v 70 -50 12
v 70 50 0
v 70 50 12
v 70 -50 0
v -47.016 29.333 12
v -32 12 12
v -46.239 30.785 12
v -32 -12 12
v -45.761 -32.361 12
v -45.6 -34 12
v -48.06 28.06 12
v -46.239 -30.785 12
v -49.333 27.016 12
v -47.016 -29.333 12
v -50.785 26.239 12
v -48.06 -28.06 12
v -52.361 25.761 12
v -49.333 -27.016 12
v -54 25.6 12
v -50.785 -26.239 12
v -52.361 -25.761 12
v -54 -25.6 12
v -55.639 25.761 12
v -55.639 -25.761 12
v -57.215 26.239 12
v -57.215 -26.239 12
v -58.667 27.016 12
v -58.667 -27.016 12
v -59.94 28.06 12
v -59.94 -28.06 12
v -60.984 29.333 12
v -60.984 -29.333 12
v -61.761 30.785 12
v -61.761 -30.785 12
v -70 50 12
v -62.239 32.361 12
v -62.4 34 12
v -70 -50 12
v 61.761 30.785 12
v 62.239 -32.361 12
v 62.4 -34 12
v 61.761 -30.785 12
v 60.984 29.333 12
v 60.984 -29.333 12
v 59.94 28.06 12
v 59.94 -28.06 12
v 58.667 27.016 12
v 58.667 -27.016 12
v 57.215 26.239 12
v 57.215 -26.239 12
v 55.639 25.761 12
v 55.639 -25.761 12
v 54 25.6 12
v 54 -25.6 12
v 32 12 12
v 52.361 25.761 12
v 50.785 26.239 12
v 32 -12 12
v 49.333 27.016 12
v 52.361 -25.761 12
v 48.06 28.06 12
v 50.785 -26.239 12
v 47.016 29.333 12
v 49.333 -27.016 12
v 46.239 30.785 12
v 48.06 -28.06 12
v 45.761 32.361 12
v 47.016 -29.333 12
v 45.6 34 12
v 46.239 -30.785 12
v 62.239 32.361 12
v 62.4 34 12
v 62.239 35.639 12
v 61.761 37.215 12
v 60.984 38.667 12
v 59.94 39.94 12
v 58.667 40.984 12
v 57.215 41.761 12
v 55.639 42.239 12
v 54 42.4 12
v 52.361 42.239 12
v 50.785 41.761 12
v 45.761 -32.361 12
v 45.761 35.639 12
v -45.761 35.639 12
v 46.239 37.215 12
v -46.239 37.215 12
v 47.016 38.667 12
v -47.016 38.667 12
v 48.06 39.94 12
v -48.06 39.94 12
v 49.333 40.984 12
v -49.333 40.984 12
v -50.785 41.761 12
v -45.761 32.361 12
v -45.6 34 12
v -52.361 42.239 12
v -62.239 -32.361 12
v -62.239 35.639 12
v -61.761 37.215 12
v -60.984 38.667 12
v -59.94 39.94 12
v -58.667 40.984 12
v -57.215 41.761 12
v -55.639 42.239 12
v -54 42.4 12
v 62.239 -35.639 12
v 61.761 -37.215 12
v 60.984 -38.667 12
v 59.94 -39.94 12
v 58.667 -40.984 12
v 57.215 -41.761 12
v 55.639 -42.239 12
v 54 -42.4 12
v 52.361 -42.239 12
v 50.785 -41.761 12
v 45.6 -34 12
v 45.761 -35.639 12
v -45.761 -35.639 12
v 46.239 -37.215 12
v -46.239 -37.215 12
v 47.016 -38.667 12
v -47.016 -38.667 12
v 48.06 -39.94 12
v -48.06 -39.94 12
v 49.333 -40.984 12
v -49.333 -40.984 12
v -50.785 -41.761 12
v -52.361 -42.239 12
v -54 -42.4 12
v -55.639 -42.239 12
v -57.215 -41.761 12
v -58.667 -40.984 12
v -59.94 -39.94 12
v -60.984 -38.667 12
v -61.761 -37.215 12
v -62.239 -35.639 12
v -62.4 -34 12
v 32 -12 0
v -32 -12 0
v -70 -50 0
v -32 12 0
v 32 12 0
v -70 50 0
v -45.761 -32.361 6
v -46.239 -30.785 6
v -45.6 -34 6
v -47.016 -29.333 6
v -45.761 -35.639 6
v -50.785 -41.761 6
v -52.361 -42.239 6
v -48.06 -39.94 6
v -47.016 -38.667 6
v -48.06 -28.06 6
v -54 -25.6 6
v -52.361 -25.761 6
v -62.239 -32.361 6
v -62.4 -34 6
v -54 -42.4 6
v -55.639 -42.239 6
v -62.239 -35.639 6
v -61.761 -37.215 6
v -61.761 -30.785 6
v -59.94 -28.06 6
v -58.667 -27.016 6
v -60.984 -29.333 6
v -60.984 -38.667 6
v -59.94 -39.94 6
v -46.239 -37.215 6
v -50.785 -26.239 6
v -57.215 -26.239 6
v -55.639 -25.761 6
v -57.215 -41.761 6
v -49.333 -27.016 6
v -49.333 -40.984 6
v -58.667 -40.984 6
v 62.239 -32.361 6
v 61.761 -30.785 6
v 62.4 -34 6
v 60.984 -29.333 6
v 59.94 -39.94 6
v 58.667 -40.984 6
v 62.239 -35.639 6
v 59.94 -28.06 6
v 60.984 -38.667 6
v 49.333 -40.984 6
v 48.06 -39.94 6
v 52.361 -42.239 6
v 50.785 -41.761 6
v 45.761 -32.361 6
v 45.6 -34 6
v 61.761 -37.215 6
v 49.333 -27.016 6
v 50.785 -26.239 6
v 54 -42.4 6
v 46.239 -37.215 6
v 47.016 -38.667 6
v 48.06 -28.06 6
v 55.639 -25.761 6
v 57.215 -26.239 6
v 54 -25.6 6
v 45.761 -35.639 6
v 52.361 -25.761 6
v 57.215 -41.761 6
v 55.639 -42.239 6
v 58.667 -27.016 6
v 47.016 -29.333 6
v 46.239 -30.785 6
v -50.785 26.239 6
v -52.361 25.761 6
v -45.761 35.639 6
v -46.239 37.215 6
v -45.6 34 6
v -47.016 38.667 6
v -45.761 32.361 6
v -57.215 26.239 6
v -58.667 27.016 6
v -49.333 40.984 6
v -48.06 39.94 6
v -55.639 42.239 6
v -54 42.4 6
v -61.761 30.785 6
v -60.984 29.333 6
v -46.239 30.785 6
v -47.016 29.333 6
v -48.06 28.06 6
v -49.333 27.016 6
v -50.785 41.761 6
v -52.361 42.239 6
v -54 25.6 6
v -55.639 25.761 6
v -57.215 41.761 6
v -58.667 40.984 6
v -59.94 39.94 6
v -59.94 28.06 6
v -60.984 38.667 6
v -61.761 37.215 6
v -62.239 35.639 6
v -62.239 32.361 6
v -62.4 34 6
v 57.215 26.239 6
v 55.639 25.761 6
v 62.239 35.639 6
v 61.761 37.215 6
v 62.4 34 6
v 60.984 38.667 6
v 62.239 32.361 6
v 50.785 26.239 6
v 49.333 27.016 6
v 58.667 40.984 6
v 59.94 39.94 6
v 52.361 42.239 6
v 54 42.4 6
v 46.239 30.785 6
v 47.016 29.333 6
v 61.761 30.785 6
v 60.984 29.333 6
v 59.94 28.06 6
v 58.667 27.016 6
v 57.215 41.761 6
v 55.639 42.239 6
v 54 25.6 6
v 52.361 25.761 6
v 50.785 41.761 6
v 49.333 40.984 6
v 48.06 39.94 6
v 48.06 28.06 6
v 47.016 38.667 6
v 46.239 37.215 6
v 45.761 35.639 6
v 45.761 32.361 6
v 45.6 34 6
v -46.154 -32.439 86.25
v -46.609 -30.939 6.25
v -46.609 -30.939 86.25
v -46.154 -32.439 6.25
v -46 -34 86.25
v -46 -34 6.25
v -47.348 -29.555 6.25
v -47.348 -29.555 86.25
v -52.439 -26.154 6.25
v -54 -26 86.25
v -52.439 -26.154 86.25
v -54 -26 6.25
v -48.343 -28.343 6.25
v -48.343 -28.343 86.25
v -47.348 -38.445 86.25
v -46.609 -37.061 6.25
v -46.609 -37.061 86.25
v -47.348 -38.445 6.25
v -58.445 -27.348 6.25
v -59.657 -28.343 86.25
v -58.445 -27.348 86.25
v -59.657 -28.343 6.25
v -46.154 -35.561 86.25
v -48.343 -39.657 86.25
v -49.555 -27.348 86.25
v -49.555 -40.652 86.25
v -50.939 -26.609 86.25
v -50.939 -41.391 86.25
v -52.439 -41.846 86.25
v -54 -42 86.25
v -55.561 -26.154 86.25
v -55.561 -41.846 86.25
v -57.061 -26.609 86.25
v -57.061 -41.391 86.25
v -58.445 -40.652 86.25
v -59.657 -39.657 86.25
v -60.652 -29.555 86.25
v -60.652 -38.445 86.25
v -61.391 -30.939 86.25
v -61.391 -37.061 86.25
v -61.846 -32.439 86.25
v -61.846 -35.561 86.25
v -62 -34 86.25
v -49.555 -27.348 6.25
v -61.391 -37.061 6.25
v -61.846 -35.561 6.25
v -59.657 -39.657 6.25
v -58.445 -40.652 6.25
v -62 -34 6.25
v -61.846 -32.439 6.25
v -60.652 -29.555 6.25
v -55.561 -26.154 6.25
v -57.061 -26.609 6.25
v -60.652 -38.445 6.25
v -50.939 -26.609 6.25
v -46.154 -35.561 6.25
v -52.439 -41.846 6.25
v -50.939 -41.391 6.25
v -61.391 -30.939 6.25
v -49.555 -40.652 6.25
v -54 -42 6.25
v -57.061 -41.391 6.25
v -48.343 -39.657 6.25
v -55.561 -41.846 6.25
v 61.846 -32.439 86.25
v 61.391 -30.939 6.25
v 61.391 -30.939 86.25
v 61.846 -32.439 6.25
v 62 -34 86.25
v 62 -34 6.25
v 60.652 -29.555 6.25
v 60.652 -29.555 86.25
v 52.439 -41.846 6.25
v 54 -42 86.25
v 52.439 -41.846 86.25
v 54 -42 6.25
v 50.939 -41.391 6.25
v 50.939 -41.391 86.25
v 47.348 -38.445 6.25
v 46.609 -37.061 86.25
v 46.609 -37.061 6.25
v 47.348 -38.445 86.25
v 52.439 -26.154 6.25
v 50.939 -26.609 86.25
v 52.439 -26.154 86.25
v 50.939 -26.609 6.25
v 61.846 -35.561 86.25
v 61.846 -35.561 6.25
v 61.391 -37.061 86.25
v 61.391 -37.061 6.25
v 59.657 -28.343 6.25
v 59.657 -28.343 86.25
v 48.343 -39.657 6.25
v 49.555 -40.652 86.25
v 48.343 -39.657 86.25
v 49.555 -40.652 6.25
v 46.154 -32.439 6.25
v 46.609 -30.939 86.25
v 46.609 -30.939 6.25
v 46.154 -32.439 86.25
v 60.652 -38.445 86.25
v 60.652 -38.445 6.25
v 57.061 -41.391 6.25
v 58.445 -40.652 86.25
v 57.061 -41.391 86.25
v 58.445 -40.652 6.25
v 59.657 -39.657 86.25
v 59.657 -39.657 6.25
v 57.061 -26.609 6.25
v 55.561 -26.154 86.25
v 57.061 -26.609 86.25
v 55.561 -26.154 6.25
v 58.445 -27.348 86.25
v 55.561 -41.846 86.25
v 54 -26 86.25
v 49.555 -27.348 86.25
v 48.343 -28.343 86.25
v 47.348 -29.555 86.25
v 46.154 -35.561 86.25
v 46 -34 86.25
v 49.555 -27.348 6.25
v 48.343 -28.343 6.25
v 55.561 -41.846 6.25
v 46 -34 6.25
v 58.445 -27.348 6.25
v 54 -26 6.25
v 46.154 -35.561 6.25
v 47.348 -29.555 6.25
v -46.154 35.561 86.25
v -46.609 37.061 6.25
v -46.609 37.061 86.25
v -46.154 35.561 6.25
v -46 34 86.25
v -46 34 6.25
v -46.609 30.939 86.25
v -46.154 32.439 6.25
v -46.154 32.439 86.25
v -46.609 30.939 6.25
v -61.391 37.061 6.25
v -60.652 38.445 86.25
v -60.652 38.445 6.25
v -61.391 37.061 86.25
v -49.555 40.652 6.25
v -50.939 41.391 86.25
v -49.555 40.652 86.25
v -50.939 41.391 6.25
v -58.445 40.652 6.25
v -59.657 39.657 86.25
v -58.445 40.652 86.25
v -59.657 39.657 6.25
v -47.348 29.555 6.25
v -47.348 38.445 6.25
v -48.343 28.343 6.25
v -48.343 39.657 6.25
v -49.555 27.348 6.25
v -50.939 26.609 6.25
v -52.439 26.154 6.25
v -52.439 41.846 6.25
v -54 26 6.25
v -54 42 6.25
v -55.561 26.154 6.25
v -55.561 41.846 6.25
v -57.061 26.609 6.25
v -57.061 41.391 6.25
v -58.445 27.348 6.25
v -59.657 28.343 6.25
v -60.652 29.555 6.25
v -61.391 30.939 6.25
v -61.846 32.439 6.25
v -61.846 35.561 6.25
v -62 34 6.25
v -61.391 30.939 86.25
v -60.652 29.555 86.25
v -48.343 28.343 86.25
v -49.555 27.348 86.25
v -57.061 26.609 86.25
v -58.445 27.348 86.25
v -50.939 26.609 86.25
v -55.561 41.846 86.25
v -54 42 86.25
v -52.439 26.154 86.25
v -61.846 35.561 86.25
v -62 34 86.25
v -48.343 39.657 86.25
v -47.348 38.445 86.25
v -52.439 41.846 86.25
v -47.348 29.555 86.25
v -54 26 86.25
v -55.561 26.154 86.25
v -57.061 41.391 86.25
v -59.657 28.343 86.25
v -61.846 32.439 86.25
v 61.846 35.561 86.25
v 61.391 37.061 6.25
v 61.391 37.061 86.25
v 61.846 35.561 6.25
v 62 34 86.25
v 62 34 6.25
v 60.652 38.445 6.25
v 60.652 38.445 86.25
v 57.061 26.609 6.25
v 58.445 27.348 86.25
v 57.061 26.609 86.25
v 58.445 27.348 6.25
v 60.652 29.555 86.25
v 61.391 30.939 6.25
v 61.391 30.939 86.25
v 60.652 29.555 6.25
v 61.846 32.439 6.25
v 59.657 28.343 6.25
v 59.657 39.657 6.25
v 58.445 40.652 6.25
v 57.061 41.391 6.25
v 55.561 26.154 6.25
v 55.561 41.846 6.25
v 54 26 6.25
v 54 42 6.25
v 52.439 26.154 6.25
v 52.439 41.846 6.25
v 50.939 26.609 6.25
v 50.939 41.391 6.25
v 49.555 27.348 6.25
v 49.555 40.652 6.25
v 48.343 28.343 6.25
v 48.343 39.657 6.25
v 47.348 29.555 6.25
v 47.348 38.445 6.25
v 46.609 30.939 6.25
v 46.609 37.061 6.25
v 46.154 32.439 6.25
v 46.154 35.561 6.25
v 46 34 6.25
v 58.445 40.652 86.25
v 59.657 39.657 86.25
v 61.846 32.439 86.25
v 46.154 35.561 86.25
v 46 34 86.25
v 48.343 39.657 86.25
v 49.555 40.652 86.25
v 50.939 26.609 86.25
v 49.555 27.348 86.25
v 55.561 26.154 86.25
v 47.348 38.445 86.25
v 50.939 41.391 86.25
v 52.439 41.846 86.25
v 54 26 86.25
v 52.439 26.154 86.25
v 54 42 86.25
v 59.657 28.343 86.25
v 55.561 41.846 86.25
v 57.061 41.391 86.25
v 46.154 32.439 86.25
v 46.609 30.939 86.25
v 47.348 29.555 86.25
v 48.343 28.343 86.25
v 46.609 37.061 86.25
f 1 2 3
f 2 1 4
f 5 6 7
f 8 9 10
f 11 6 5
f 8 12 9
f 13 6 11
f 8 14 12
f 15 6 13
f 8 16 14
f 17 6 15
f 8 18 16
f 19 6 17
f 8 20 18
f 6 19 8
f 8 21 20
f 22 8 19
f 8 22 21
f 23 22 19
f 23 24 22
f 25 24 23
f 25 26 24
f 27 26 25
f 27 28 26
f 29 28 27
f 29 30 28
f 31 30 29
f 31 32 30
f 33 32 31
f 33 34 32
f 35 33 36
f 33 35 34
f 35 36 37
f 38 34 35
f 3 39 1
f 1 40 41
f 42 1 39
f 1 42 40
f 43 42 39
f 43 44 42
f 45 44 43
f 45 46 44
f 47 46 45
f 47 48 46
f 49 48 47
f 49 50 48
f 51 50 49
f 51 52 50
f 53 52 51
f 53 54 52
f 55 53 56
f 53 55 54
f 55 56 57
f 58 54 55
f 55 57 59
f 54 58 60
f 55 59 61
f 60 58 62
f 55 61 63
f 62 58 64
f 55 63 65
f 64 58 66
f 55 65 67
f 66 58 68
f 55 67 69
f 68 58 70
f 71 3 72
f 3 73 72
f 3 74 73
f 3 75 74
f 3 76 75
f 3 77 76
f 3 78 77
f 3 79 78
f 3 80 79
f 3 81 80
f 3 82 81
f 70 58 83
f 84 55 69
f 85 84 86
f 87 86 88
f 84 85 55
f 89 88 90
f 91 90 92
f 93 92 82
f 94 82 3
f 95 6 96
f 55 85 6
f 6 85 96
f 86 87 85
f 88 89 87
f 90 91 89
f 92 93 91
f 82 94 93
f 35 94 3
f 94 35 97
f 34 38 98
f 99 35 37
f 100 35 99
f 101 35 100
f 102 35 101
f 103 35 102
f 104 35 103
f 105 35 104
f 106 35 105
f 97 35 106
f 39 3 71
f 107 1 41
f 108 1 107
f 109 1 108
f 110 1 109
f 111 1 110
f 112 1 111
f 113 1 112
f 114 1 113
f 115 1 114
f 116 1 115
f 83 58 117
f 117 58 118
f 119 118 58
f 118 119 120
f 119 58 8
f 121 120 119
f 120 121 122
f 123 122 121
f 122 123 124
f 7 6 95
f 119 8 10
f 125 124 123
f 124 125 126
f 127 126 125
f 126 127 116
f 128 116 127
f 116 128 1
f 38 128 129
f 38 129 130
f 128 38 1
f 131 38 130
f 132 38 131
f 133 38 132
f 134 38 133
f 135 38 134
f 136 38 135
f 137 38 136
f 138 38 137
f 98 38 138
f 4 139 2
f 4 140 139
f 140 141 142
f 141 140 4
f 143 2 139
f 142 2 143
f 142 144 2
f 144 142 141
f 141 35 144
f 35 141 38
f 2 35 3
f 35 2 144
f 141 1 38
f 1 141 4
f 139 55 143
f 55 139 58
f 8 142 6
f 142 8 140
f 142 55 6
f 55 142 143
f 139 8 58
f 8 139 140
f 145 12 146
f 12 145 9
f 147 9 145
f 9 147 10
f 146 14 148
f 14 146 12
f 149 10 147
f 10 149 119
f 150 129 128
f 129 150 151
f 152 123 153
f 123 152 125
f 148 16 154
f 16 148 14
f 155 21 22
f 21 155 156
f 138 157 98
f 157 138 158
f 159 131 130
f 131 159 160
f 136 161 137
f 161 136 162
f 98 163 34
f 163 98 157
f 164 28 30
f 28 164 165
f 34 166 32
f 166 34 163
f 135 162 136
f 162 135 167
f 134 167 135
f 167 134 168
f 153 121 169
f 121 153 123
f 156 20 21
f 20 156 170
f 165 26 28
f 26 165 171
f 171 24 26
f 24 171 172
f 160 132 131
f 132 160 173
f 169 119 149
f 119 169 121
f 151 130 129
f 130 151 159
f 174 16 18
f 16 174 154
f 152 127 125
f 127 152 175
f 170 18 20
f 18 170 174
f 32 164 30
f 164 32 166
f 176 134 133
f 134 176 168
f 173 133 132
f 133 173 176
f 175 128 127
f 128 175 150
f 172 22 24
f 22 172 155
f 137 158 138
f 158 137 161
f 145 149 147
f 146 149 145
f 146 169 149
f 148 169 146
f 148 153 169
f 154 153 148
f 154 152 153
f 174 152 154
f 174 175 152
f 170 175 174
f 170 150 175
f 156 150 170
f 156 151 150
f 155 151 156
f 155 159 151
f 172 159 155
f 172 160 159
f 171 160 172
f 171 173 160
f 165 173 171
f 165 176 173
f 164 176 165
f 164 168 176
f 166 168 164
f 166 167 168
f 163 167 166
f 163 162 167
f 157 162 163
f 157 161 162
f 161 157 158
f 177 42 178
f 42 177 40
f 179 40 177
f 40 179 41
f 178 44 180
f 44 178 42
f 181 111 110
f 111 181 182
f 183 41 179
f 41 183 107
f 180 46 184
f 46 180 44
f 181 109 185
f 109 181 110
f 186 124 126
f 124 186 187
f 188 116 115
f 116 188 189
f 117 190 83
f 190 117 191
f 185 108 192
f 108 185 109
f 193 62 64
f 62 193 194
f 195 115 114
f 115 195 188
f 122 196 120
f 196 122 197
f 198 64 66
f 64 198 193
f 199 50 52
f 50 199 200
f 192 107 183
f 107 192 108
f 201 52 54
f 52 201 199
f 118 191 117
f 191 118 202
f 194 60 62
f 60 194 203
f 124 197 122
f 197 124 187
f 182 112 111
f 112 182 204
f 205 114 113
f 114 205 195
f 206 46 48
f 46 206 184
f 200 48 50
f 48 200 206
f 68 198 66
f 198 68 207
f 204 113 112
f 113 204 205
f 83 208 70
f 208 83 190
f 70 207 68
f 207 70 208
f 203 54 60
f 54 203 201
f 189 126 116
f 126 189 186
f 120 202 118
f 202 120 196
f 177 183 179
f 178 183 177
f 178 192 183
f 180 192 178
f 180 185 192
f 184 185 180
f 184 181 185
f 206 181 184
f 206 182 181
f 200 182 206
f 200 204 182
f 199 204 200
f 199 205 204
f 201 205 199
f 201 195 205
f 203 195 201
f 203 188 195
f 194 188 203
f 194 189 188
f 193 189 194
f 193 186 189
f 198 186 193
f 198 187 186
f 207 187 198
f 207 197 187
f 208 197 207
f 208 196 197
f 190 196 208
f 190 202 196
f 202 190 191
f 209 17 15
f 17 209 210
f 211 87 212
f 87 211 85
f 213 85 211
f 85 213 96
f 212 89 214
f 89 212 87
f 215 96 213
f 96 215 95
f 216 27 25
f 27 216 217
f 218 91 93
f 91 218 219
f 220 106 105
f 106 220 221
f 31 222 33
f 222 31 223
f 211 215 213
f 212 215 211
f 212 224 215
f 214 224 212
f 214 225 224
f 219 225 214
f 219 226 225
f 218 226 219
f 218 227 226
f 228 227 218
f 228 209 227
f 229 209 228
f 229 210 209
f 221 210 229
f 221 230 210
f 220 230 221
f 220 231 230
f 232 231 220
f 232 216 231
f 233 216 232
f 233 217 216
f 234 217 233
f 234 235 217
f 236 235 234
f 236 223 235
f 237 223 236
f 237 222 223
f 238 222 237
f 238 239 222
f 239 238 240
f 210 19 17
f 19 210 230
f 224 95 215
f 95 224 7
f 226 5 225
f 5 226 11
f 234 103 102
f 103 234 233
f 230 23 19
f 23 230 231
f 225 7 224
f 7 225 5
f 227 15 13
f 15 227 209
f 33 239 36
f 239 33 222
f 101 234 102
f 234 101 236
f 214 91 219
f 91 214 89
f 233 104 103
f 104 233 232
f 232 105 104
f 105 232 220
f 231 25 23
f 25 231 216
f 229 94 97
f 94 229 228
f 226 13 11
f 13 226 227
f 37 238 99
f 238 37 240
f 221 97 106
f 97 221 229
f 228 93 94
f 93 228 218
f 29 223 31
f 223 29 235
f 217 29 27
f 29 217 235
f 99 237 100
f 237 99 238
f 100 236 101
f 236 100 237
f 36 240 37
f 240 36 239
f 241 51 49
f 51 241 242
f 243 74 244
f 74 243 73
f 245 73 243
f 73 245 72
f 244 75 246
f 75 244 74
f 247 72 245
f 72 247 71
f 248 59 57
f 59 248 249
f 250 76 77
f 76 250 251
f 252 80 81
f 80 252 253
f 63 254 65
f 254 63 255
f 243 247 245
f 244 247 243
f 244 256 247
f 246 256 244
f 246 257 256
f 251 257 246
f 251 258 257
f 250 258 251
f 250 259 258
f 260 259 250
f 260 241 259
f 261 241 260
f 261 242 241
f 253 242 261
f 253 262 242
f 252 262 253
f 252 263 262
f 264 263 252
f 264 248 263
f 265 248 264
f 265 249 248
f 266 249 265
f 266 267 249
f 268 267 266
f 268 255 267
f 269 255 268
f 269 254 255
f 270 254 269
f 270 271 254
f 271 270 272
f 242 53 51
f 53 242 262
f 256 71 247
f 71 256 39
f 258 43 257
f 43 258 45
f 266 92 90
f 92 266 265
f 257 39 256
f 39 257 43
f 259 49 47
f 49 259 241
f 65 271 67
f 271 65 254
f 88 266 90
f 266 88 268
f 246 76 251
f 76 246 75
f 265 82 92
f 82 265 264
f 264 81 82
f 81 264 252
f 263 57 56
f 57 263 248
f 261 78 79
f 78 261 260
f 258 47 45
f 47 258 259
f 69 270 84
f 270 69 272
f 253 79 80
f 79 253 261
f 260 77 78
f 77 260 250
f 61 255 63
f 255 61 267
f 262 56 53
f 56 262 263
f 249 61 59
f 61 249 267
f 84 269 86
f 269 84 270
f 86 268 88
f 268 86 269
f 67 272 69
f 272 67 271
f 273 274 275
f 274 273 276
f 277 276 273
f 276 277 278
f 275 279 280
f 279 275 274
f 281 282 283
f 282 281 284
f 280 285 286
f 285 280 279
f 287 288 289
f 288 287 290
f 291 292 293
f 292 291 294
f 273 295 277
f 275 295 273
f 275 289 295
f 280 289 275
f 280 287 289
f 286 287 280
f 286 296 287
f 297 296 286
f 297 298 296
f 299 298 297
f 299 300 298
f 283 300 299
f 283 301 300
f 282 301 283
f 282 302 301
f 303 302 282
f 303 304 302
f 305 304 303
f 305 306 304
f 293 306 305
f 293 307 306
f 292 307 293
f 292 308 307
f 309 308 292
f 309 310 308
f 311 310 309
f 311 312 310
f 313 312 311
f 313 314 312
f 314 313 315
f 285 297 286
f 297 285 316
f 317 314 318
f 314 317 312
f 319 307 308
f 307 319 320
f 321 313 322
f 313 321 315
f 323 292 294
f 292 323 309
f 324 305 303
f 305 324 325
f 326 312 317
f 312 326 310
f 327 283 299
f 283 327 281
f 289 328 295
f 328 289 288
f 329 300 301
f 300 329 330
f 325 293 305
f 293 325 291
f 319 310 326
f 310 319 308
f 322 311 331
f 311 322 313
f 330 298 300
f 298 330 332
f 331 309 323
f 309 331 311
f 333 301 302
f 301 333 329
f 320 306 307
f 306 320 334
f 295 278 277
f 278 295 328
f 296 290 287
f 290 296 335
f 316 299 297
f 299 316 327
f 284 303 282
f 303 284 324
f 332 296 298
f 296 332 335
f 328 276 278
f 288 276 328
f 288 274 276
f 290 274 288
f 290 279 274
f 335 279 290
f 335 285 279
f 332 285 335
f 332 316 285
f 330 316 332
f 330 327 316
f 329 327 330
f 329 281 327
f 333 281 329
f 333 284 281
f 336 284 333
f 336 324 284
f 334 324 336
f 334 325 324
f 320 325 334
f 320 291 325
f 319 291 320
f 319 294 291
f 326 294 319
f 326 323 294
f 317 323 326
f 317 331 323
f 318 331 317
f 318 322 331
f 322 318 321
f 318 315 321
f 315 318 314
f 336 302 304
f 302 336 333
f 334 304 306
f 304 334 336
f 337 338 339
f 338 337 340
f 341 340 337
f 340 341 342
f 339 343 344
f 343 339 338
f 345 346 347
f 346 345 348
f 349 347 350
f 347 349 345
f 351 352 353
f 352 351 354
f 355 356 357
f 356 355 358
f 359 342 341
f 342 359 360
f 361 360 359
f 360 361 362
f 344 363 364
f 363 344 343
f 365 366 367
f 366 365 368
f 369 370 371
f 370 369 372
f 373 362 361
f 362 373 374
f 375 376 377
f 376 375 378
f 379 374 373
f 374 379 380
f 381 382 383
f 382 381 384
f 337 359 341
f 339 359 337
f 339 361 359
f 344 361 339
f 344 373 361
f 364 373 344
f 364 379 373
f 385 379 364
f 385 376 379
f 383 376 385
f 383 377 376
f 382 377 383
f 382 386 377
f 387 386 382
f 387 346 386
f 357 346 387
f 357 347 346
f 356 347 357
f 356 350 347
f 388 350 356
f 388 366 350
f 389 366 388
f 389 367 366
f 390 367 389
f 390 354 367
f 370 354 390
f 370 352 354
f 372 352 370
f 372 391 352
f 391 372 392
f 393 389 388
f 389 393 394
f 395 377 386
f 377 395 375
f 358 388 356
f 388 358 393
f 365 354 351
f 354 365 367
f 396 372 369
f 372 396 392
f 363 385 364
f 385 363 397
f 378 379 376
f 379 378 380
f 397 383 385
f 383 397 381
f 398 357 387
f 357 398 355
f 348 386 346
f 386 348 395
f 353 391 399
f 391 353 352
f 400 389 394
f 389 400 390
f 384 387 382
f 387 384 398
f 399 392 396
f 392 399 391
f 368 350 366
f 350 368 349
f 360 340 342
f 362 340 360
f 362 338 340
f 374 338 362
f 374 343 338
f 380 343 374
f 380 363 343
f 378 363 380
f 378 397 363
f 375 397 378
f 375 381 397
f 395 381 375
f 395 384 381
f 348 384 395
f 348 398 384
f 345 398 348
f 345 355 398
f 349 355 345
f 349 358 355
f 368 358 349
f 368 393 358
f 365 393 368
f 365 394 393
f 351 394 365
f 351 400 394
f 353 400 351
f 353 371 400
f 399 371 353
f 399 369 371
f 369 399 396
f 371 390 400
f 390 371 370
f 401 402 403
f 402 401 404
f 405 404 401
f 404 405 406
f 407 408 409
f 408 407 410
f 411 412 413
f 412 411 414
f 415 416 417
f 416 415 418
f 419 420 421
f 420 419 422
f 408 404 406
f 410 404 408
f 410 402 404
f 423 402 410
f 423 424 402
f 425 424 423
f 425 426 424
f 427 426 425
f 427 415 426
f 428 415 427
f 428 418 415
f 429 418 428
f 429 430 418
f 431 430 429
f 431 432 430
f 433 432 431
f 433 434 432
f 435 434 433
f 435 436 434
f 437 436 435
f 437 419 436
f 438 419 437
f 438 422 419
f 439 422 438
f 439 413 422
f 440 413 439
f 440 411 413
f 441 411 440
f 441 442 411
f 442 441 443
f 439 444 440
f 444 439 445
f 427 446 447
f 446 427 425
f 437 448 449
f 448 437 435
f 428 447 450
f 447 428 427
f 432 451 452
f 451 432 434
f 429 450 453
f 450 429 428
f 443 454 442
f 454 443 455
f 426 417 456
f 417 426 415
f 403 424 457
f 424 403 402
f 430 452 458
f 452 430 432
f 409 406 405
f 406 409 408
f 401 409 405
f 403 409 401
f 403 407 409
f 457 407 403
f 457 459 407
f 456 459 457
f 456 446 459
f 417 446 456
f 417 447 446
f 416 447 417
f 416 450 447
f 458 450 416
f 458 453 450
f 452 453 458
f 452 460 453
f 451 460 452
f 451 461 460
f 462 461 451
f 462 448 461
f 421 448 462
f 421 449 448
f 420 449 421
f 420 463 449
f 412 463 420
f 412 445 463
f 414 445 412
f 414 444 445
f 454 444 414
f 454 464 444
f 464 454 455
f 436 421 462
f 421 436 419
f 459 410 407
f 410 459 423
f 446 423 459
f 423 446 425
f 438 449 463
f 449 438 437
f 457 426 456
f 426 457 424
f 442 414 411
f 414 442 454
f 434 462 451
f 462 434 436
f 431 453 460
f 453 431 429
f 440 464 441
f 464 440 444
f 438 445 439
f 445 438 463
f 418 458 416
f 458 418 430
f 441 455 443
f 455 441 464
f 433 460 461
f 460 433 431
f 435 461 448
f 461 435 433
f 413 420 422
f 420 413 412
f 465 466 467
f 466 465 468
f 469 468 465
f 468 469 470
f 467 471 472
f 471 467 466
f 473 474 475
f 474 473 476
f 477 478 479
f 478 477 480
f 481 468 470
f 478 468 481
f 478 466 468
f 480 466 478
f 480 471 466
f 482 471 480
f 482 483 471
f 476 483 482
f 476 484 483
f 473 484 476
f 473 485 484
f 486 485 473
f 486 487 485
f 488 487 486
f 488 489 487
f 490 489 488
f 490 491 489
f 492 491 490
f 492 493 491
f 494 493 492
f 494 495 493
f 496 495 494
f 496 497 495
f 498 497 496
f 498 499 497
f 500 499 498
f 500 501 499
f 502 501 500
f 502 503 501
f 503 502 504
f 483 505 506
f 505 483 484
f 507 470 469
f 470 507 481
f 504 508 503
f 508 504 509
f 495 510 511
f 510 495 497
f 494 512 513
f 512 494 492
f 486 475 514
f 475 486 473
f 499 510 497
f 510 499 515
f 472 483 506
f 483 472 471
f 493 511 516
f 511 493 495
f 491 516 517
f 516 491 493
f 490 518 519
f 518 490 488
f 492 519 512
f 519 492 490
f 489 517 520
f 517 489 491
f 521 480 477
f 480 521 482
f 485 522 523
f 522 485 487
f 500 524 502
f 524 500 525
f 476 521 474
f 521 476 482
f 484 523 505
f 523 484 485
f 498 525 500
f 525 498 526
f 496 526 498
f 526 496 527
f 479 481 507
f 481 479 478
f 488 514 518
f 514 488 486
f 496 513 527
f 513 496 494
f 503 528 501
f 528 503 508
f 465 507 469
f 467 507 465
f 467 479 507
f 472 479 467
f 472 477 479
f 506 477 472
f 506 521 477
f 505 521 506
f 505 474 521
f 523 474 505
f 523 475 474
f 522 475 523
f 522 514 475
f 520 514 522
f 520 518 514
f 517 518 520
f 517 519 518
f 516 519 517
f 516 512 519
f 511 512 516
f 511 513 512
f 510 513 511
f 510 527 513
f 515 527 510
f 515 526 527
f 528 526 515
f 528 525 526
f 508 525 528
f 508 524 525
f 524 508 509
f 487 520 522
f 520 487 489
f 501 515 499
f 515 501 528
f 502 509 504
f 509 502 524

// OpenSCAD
$fn = 32;

// ------------------------------------------------------------------------
// Frame with four posts: 140 x 100 mm frame, four d16 posts
// Every part is its own module, assembly() places them once.
// ------------------------------------------------------------------------

// --- part 1 ---
module base_frame() {
  difference() {
    translate([-70, -50, 0]) cube([140, 100, 12]);
    translate([-32, -12, -1]) cube([64, 24, 14]);
    translate([-54, -34, 6]) cylinder(h = 7, d = 16.8);
    translate([54, -34, 6]) cylinder(h = 7, d = 16.8);
    translate([-54, 34, 6]) cylinder(h = 7, d = 16.8);
    translate([54, 34, 6]) cylinder(h = 7, d = 16.8);
  }
}

// --- part 2 ---
module post1() {
  cylinder(h = 80, d = 16);
}

// --- part 3 ---
module post2() {
  cylinder(h = 80, d = 16);
}

// --- part 4 ---
module post3() {
  cylinder(h = 80, d = 16);
}

// --- part 5 ---
module post4() {
  cylinder(h = 80, d = 16);
}

// --- assembly ---
module assembly() {
  translate([0, 0, 0]) rotate([0, 0, 0]) base_frame();
  translate([-54, -34, 6.25]) rotate([0, 0, 0]) post1();
  translate([54, -34, 6.25]) rotate([0, 0, 0]) post2();
  translate([-54, 34, 6.25]) rotate([0, 0, 0]) post3();
  translate([54, 34, 6.25]) rotate([0, 0, 0]) post4();
}

assembly();
